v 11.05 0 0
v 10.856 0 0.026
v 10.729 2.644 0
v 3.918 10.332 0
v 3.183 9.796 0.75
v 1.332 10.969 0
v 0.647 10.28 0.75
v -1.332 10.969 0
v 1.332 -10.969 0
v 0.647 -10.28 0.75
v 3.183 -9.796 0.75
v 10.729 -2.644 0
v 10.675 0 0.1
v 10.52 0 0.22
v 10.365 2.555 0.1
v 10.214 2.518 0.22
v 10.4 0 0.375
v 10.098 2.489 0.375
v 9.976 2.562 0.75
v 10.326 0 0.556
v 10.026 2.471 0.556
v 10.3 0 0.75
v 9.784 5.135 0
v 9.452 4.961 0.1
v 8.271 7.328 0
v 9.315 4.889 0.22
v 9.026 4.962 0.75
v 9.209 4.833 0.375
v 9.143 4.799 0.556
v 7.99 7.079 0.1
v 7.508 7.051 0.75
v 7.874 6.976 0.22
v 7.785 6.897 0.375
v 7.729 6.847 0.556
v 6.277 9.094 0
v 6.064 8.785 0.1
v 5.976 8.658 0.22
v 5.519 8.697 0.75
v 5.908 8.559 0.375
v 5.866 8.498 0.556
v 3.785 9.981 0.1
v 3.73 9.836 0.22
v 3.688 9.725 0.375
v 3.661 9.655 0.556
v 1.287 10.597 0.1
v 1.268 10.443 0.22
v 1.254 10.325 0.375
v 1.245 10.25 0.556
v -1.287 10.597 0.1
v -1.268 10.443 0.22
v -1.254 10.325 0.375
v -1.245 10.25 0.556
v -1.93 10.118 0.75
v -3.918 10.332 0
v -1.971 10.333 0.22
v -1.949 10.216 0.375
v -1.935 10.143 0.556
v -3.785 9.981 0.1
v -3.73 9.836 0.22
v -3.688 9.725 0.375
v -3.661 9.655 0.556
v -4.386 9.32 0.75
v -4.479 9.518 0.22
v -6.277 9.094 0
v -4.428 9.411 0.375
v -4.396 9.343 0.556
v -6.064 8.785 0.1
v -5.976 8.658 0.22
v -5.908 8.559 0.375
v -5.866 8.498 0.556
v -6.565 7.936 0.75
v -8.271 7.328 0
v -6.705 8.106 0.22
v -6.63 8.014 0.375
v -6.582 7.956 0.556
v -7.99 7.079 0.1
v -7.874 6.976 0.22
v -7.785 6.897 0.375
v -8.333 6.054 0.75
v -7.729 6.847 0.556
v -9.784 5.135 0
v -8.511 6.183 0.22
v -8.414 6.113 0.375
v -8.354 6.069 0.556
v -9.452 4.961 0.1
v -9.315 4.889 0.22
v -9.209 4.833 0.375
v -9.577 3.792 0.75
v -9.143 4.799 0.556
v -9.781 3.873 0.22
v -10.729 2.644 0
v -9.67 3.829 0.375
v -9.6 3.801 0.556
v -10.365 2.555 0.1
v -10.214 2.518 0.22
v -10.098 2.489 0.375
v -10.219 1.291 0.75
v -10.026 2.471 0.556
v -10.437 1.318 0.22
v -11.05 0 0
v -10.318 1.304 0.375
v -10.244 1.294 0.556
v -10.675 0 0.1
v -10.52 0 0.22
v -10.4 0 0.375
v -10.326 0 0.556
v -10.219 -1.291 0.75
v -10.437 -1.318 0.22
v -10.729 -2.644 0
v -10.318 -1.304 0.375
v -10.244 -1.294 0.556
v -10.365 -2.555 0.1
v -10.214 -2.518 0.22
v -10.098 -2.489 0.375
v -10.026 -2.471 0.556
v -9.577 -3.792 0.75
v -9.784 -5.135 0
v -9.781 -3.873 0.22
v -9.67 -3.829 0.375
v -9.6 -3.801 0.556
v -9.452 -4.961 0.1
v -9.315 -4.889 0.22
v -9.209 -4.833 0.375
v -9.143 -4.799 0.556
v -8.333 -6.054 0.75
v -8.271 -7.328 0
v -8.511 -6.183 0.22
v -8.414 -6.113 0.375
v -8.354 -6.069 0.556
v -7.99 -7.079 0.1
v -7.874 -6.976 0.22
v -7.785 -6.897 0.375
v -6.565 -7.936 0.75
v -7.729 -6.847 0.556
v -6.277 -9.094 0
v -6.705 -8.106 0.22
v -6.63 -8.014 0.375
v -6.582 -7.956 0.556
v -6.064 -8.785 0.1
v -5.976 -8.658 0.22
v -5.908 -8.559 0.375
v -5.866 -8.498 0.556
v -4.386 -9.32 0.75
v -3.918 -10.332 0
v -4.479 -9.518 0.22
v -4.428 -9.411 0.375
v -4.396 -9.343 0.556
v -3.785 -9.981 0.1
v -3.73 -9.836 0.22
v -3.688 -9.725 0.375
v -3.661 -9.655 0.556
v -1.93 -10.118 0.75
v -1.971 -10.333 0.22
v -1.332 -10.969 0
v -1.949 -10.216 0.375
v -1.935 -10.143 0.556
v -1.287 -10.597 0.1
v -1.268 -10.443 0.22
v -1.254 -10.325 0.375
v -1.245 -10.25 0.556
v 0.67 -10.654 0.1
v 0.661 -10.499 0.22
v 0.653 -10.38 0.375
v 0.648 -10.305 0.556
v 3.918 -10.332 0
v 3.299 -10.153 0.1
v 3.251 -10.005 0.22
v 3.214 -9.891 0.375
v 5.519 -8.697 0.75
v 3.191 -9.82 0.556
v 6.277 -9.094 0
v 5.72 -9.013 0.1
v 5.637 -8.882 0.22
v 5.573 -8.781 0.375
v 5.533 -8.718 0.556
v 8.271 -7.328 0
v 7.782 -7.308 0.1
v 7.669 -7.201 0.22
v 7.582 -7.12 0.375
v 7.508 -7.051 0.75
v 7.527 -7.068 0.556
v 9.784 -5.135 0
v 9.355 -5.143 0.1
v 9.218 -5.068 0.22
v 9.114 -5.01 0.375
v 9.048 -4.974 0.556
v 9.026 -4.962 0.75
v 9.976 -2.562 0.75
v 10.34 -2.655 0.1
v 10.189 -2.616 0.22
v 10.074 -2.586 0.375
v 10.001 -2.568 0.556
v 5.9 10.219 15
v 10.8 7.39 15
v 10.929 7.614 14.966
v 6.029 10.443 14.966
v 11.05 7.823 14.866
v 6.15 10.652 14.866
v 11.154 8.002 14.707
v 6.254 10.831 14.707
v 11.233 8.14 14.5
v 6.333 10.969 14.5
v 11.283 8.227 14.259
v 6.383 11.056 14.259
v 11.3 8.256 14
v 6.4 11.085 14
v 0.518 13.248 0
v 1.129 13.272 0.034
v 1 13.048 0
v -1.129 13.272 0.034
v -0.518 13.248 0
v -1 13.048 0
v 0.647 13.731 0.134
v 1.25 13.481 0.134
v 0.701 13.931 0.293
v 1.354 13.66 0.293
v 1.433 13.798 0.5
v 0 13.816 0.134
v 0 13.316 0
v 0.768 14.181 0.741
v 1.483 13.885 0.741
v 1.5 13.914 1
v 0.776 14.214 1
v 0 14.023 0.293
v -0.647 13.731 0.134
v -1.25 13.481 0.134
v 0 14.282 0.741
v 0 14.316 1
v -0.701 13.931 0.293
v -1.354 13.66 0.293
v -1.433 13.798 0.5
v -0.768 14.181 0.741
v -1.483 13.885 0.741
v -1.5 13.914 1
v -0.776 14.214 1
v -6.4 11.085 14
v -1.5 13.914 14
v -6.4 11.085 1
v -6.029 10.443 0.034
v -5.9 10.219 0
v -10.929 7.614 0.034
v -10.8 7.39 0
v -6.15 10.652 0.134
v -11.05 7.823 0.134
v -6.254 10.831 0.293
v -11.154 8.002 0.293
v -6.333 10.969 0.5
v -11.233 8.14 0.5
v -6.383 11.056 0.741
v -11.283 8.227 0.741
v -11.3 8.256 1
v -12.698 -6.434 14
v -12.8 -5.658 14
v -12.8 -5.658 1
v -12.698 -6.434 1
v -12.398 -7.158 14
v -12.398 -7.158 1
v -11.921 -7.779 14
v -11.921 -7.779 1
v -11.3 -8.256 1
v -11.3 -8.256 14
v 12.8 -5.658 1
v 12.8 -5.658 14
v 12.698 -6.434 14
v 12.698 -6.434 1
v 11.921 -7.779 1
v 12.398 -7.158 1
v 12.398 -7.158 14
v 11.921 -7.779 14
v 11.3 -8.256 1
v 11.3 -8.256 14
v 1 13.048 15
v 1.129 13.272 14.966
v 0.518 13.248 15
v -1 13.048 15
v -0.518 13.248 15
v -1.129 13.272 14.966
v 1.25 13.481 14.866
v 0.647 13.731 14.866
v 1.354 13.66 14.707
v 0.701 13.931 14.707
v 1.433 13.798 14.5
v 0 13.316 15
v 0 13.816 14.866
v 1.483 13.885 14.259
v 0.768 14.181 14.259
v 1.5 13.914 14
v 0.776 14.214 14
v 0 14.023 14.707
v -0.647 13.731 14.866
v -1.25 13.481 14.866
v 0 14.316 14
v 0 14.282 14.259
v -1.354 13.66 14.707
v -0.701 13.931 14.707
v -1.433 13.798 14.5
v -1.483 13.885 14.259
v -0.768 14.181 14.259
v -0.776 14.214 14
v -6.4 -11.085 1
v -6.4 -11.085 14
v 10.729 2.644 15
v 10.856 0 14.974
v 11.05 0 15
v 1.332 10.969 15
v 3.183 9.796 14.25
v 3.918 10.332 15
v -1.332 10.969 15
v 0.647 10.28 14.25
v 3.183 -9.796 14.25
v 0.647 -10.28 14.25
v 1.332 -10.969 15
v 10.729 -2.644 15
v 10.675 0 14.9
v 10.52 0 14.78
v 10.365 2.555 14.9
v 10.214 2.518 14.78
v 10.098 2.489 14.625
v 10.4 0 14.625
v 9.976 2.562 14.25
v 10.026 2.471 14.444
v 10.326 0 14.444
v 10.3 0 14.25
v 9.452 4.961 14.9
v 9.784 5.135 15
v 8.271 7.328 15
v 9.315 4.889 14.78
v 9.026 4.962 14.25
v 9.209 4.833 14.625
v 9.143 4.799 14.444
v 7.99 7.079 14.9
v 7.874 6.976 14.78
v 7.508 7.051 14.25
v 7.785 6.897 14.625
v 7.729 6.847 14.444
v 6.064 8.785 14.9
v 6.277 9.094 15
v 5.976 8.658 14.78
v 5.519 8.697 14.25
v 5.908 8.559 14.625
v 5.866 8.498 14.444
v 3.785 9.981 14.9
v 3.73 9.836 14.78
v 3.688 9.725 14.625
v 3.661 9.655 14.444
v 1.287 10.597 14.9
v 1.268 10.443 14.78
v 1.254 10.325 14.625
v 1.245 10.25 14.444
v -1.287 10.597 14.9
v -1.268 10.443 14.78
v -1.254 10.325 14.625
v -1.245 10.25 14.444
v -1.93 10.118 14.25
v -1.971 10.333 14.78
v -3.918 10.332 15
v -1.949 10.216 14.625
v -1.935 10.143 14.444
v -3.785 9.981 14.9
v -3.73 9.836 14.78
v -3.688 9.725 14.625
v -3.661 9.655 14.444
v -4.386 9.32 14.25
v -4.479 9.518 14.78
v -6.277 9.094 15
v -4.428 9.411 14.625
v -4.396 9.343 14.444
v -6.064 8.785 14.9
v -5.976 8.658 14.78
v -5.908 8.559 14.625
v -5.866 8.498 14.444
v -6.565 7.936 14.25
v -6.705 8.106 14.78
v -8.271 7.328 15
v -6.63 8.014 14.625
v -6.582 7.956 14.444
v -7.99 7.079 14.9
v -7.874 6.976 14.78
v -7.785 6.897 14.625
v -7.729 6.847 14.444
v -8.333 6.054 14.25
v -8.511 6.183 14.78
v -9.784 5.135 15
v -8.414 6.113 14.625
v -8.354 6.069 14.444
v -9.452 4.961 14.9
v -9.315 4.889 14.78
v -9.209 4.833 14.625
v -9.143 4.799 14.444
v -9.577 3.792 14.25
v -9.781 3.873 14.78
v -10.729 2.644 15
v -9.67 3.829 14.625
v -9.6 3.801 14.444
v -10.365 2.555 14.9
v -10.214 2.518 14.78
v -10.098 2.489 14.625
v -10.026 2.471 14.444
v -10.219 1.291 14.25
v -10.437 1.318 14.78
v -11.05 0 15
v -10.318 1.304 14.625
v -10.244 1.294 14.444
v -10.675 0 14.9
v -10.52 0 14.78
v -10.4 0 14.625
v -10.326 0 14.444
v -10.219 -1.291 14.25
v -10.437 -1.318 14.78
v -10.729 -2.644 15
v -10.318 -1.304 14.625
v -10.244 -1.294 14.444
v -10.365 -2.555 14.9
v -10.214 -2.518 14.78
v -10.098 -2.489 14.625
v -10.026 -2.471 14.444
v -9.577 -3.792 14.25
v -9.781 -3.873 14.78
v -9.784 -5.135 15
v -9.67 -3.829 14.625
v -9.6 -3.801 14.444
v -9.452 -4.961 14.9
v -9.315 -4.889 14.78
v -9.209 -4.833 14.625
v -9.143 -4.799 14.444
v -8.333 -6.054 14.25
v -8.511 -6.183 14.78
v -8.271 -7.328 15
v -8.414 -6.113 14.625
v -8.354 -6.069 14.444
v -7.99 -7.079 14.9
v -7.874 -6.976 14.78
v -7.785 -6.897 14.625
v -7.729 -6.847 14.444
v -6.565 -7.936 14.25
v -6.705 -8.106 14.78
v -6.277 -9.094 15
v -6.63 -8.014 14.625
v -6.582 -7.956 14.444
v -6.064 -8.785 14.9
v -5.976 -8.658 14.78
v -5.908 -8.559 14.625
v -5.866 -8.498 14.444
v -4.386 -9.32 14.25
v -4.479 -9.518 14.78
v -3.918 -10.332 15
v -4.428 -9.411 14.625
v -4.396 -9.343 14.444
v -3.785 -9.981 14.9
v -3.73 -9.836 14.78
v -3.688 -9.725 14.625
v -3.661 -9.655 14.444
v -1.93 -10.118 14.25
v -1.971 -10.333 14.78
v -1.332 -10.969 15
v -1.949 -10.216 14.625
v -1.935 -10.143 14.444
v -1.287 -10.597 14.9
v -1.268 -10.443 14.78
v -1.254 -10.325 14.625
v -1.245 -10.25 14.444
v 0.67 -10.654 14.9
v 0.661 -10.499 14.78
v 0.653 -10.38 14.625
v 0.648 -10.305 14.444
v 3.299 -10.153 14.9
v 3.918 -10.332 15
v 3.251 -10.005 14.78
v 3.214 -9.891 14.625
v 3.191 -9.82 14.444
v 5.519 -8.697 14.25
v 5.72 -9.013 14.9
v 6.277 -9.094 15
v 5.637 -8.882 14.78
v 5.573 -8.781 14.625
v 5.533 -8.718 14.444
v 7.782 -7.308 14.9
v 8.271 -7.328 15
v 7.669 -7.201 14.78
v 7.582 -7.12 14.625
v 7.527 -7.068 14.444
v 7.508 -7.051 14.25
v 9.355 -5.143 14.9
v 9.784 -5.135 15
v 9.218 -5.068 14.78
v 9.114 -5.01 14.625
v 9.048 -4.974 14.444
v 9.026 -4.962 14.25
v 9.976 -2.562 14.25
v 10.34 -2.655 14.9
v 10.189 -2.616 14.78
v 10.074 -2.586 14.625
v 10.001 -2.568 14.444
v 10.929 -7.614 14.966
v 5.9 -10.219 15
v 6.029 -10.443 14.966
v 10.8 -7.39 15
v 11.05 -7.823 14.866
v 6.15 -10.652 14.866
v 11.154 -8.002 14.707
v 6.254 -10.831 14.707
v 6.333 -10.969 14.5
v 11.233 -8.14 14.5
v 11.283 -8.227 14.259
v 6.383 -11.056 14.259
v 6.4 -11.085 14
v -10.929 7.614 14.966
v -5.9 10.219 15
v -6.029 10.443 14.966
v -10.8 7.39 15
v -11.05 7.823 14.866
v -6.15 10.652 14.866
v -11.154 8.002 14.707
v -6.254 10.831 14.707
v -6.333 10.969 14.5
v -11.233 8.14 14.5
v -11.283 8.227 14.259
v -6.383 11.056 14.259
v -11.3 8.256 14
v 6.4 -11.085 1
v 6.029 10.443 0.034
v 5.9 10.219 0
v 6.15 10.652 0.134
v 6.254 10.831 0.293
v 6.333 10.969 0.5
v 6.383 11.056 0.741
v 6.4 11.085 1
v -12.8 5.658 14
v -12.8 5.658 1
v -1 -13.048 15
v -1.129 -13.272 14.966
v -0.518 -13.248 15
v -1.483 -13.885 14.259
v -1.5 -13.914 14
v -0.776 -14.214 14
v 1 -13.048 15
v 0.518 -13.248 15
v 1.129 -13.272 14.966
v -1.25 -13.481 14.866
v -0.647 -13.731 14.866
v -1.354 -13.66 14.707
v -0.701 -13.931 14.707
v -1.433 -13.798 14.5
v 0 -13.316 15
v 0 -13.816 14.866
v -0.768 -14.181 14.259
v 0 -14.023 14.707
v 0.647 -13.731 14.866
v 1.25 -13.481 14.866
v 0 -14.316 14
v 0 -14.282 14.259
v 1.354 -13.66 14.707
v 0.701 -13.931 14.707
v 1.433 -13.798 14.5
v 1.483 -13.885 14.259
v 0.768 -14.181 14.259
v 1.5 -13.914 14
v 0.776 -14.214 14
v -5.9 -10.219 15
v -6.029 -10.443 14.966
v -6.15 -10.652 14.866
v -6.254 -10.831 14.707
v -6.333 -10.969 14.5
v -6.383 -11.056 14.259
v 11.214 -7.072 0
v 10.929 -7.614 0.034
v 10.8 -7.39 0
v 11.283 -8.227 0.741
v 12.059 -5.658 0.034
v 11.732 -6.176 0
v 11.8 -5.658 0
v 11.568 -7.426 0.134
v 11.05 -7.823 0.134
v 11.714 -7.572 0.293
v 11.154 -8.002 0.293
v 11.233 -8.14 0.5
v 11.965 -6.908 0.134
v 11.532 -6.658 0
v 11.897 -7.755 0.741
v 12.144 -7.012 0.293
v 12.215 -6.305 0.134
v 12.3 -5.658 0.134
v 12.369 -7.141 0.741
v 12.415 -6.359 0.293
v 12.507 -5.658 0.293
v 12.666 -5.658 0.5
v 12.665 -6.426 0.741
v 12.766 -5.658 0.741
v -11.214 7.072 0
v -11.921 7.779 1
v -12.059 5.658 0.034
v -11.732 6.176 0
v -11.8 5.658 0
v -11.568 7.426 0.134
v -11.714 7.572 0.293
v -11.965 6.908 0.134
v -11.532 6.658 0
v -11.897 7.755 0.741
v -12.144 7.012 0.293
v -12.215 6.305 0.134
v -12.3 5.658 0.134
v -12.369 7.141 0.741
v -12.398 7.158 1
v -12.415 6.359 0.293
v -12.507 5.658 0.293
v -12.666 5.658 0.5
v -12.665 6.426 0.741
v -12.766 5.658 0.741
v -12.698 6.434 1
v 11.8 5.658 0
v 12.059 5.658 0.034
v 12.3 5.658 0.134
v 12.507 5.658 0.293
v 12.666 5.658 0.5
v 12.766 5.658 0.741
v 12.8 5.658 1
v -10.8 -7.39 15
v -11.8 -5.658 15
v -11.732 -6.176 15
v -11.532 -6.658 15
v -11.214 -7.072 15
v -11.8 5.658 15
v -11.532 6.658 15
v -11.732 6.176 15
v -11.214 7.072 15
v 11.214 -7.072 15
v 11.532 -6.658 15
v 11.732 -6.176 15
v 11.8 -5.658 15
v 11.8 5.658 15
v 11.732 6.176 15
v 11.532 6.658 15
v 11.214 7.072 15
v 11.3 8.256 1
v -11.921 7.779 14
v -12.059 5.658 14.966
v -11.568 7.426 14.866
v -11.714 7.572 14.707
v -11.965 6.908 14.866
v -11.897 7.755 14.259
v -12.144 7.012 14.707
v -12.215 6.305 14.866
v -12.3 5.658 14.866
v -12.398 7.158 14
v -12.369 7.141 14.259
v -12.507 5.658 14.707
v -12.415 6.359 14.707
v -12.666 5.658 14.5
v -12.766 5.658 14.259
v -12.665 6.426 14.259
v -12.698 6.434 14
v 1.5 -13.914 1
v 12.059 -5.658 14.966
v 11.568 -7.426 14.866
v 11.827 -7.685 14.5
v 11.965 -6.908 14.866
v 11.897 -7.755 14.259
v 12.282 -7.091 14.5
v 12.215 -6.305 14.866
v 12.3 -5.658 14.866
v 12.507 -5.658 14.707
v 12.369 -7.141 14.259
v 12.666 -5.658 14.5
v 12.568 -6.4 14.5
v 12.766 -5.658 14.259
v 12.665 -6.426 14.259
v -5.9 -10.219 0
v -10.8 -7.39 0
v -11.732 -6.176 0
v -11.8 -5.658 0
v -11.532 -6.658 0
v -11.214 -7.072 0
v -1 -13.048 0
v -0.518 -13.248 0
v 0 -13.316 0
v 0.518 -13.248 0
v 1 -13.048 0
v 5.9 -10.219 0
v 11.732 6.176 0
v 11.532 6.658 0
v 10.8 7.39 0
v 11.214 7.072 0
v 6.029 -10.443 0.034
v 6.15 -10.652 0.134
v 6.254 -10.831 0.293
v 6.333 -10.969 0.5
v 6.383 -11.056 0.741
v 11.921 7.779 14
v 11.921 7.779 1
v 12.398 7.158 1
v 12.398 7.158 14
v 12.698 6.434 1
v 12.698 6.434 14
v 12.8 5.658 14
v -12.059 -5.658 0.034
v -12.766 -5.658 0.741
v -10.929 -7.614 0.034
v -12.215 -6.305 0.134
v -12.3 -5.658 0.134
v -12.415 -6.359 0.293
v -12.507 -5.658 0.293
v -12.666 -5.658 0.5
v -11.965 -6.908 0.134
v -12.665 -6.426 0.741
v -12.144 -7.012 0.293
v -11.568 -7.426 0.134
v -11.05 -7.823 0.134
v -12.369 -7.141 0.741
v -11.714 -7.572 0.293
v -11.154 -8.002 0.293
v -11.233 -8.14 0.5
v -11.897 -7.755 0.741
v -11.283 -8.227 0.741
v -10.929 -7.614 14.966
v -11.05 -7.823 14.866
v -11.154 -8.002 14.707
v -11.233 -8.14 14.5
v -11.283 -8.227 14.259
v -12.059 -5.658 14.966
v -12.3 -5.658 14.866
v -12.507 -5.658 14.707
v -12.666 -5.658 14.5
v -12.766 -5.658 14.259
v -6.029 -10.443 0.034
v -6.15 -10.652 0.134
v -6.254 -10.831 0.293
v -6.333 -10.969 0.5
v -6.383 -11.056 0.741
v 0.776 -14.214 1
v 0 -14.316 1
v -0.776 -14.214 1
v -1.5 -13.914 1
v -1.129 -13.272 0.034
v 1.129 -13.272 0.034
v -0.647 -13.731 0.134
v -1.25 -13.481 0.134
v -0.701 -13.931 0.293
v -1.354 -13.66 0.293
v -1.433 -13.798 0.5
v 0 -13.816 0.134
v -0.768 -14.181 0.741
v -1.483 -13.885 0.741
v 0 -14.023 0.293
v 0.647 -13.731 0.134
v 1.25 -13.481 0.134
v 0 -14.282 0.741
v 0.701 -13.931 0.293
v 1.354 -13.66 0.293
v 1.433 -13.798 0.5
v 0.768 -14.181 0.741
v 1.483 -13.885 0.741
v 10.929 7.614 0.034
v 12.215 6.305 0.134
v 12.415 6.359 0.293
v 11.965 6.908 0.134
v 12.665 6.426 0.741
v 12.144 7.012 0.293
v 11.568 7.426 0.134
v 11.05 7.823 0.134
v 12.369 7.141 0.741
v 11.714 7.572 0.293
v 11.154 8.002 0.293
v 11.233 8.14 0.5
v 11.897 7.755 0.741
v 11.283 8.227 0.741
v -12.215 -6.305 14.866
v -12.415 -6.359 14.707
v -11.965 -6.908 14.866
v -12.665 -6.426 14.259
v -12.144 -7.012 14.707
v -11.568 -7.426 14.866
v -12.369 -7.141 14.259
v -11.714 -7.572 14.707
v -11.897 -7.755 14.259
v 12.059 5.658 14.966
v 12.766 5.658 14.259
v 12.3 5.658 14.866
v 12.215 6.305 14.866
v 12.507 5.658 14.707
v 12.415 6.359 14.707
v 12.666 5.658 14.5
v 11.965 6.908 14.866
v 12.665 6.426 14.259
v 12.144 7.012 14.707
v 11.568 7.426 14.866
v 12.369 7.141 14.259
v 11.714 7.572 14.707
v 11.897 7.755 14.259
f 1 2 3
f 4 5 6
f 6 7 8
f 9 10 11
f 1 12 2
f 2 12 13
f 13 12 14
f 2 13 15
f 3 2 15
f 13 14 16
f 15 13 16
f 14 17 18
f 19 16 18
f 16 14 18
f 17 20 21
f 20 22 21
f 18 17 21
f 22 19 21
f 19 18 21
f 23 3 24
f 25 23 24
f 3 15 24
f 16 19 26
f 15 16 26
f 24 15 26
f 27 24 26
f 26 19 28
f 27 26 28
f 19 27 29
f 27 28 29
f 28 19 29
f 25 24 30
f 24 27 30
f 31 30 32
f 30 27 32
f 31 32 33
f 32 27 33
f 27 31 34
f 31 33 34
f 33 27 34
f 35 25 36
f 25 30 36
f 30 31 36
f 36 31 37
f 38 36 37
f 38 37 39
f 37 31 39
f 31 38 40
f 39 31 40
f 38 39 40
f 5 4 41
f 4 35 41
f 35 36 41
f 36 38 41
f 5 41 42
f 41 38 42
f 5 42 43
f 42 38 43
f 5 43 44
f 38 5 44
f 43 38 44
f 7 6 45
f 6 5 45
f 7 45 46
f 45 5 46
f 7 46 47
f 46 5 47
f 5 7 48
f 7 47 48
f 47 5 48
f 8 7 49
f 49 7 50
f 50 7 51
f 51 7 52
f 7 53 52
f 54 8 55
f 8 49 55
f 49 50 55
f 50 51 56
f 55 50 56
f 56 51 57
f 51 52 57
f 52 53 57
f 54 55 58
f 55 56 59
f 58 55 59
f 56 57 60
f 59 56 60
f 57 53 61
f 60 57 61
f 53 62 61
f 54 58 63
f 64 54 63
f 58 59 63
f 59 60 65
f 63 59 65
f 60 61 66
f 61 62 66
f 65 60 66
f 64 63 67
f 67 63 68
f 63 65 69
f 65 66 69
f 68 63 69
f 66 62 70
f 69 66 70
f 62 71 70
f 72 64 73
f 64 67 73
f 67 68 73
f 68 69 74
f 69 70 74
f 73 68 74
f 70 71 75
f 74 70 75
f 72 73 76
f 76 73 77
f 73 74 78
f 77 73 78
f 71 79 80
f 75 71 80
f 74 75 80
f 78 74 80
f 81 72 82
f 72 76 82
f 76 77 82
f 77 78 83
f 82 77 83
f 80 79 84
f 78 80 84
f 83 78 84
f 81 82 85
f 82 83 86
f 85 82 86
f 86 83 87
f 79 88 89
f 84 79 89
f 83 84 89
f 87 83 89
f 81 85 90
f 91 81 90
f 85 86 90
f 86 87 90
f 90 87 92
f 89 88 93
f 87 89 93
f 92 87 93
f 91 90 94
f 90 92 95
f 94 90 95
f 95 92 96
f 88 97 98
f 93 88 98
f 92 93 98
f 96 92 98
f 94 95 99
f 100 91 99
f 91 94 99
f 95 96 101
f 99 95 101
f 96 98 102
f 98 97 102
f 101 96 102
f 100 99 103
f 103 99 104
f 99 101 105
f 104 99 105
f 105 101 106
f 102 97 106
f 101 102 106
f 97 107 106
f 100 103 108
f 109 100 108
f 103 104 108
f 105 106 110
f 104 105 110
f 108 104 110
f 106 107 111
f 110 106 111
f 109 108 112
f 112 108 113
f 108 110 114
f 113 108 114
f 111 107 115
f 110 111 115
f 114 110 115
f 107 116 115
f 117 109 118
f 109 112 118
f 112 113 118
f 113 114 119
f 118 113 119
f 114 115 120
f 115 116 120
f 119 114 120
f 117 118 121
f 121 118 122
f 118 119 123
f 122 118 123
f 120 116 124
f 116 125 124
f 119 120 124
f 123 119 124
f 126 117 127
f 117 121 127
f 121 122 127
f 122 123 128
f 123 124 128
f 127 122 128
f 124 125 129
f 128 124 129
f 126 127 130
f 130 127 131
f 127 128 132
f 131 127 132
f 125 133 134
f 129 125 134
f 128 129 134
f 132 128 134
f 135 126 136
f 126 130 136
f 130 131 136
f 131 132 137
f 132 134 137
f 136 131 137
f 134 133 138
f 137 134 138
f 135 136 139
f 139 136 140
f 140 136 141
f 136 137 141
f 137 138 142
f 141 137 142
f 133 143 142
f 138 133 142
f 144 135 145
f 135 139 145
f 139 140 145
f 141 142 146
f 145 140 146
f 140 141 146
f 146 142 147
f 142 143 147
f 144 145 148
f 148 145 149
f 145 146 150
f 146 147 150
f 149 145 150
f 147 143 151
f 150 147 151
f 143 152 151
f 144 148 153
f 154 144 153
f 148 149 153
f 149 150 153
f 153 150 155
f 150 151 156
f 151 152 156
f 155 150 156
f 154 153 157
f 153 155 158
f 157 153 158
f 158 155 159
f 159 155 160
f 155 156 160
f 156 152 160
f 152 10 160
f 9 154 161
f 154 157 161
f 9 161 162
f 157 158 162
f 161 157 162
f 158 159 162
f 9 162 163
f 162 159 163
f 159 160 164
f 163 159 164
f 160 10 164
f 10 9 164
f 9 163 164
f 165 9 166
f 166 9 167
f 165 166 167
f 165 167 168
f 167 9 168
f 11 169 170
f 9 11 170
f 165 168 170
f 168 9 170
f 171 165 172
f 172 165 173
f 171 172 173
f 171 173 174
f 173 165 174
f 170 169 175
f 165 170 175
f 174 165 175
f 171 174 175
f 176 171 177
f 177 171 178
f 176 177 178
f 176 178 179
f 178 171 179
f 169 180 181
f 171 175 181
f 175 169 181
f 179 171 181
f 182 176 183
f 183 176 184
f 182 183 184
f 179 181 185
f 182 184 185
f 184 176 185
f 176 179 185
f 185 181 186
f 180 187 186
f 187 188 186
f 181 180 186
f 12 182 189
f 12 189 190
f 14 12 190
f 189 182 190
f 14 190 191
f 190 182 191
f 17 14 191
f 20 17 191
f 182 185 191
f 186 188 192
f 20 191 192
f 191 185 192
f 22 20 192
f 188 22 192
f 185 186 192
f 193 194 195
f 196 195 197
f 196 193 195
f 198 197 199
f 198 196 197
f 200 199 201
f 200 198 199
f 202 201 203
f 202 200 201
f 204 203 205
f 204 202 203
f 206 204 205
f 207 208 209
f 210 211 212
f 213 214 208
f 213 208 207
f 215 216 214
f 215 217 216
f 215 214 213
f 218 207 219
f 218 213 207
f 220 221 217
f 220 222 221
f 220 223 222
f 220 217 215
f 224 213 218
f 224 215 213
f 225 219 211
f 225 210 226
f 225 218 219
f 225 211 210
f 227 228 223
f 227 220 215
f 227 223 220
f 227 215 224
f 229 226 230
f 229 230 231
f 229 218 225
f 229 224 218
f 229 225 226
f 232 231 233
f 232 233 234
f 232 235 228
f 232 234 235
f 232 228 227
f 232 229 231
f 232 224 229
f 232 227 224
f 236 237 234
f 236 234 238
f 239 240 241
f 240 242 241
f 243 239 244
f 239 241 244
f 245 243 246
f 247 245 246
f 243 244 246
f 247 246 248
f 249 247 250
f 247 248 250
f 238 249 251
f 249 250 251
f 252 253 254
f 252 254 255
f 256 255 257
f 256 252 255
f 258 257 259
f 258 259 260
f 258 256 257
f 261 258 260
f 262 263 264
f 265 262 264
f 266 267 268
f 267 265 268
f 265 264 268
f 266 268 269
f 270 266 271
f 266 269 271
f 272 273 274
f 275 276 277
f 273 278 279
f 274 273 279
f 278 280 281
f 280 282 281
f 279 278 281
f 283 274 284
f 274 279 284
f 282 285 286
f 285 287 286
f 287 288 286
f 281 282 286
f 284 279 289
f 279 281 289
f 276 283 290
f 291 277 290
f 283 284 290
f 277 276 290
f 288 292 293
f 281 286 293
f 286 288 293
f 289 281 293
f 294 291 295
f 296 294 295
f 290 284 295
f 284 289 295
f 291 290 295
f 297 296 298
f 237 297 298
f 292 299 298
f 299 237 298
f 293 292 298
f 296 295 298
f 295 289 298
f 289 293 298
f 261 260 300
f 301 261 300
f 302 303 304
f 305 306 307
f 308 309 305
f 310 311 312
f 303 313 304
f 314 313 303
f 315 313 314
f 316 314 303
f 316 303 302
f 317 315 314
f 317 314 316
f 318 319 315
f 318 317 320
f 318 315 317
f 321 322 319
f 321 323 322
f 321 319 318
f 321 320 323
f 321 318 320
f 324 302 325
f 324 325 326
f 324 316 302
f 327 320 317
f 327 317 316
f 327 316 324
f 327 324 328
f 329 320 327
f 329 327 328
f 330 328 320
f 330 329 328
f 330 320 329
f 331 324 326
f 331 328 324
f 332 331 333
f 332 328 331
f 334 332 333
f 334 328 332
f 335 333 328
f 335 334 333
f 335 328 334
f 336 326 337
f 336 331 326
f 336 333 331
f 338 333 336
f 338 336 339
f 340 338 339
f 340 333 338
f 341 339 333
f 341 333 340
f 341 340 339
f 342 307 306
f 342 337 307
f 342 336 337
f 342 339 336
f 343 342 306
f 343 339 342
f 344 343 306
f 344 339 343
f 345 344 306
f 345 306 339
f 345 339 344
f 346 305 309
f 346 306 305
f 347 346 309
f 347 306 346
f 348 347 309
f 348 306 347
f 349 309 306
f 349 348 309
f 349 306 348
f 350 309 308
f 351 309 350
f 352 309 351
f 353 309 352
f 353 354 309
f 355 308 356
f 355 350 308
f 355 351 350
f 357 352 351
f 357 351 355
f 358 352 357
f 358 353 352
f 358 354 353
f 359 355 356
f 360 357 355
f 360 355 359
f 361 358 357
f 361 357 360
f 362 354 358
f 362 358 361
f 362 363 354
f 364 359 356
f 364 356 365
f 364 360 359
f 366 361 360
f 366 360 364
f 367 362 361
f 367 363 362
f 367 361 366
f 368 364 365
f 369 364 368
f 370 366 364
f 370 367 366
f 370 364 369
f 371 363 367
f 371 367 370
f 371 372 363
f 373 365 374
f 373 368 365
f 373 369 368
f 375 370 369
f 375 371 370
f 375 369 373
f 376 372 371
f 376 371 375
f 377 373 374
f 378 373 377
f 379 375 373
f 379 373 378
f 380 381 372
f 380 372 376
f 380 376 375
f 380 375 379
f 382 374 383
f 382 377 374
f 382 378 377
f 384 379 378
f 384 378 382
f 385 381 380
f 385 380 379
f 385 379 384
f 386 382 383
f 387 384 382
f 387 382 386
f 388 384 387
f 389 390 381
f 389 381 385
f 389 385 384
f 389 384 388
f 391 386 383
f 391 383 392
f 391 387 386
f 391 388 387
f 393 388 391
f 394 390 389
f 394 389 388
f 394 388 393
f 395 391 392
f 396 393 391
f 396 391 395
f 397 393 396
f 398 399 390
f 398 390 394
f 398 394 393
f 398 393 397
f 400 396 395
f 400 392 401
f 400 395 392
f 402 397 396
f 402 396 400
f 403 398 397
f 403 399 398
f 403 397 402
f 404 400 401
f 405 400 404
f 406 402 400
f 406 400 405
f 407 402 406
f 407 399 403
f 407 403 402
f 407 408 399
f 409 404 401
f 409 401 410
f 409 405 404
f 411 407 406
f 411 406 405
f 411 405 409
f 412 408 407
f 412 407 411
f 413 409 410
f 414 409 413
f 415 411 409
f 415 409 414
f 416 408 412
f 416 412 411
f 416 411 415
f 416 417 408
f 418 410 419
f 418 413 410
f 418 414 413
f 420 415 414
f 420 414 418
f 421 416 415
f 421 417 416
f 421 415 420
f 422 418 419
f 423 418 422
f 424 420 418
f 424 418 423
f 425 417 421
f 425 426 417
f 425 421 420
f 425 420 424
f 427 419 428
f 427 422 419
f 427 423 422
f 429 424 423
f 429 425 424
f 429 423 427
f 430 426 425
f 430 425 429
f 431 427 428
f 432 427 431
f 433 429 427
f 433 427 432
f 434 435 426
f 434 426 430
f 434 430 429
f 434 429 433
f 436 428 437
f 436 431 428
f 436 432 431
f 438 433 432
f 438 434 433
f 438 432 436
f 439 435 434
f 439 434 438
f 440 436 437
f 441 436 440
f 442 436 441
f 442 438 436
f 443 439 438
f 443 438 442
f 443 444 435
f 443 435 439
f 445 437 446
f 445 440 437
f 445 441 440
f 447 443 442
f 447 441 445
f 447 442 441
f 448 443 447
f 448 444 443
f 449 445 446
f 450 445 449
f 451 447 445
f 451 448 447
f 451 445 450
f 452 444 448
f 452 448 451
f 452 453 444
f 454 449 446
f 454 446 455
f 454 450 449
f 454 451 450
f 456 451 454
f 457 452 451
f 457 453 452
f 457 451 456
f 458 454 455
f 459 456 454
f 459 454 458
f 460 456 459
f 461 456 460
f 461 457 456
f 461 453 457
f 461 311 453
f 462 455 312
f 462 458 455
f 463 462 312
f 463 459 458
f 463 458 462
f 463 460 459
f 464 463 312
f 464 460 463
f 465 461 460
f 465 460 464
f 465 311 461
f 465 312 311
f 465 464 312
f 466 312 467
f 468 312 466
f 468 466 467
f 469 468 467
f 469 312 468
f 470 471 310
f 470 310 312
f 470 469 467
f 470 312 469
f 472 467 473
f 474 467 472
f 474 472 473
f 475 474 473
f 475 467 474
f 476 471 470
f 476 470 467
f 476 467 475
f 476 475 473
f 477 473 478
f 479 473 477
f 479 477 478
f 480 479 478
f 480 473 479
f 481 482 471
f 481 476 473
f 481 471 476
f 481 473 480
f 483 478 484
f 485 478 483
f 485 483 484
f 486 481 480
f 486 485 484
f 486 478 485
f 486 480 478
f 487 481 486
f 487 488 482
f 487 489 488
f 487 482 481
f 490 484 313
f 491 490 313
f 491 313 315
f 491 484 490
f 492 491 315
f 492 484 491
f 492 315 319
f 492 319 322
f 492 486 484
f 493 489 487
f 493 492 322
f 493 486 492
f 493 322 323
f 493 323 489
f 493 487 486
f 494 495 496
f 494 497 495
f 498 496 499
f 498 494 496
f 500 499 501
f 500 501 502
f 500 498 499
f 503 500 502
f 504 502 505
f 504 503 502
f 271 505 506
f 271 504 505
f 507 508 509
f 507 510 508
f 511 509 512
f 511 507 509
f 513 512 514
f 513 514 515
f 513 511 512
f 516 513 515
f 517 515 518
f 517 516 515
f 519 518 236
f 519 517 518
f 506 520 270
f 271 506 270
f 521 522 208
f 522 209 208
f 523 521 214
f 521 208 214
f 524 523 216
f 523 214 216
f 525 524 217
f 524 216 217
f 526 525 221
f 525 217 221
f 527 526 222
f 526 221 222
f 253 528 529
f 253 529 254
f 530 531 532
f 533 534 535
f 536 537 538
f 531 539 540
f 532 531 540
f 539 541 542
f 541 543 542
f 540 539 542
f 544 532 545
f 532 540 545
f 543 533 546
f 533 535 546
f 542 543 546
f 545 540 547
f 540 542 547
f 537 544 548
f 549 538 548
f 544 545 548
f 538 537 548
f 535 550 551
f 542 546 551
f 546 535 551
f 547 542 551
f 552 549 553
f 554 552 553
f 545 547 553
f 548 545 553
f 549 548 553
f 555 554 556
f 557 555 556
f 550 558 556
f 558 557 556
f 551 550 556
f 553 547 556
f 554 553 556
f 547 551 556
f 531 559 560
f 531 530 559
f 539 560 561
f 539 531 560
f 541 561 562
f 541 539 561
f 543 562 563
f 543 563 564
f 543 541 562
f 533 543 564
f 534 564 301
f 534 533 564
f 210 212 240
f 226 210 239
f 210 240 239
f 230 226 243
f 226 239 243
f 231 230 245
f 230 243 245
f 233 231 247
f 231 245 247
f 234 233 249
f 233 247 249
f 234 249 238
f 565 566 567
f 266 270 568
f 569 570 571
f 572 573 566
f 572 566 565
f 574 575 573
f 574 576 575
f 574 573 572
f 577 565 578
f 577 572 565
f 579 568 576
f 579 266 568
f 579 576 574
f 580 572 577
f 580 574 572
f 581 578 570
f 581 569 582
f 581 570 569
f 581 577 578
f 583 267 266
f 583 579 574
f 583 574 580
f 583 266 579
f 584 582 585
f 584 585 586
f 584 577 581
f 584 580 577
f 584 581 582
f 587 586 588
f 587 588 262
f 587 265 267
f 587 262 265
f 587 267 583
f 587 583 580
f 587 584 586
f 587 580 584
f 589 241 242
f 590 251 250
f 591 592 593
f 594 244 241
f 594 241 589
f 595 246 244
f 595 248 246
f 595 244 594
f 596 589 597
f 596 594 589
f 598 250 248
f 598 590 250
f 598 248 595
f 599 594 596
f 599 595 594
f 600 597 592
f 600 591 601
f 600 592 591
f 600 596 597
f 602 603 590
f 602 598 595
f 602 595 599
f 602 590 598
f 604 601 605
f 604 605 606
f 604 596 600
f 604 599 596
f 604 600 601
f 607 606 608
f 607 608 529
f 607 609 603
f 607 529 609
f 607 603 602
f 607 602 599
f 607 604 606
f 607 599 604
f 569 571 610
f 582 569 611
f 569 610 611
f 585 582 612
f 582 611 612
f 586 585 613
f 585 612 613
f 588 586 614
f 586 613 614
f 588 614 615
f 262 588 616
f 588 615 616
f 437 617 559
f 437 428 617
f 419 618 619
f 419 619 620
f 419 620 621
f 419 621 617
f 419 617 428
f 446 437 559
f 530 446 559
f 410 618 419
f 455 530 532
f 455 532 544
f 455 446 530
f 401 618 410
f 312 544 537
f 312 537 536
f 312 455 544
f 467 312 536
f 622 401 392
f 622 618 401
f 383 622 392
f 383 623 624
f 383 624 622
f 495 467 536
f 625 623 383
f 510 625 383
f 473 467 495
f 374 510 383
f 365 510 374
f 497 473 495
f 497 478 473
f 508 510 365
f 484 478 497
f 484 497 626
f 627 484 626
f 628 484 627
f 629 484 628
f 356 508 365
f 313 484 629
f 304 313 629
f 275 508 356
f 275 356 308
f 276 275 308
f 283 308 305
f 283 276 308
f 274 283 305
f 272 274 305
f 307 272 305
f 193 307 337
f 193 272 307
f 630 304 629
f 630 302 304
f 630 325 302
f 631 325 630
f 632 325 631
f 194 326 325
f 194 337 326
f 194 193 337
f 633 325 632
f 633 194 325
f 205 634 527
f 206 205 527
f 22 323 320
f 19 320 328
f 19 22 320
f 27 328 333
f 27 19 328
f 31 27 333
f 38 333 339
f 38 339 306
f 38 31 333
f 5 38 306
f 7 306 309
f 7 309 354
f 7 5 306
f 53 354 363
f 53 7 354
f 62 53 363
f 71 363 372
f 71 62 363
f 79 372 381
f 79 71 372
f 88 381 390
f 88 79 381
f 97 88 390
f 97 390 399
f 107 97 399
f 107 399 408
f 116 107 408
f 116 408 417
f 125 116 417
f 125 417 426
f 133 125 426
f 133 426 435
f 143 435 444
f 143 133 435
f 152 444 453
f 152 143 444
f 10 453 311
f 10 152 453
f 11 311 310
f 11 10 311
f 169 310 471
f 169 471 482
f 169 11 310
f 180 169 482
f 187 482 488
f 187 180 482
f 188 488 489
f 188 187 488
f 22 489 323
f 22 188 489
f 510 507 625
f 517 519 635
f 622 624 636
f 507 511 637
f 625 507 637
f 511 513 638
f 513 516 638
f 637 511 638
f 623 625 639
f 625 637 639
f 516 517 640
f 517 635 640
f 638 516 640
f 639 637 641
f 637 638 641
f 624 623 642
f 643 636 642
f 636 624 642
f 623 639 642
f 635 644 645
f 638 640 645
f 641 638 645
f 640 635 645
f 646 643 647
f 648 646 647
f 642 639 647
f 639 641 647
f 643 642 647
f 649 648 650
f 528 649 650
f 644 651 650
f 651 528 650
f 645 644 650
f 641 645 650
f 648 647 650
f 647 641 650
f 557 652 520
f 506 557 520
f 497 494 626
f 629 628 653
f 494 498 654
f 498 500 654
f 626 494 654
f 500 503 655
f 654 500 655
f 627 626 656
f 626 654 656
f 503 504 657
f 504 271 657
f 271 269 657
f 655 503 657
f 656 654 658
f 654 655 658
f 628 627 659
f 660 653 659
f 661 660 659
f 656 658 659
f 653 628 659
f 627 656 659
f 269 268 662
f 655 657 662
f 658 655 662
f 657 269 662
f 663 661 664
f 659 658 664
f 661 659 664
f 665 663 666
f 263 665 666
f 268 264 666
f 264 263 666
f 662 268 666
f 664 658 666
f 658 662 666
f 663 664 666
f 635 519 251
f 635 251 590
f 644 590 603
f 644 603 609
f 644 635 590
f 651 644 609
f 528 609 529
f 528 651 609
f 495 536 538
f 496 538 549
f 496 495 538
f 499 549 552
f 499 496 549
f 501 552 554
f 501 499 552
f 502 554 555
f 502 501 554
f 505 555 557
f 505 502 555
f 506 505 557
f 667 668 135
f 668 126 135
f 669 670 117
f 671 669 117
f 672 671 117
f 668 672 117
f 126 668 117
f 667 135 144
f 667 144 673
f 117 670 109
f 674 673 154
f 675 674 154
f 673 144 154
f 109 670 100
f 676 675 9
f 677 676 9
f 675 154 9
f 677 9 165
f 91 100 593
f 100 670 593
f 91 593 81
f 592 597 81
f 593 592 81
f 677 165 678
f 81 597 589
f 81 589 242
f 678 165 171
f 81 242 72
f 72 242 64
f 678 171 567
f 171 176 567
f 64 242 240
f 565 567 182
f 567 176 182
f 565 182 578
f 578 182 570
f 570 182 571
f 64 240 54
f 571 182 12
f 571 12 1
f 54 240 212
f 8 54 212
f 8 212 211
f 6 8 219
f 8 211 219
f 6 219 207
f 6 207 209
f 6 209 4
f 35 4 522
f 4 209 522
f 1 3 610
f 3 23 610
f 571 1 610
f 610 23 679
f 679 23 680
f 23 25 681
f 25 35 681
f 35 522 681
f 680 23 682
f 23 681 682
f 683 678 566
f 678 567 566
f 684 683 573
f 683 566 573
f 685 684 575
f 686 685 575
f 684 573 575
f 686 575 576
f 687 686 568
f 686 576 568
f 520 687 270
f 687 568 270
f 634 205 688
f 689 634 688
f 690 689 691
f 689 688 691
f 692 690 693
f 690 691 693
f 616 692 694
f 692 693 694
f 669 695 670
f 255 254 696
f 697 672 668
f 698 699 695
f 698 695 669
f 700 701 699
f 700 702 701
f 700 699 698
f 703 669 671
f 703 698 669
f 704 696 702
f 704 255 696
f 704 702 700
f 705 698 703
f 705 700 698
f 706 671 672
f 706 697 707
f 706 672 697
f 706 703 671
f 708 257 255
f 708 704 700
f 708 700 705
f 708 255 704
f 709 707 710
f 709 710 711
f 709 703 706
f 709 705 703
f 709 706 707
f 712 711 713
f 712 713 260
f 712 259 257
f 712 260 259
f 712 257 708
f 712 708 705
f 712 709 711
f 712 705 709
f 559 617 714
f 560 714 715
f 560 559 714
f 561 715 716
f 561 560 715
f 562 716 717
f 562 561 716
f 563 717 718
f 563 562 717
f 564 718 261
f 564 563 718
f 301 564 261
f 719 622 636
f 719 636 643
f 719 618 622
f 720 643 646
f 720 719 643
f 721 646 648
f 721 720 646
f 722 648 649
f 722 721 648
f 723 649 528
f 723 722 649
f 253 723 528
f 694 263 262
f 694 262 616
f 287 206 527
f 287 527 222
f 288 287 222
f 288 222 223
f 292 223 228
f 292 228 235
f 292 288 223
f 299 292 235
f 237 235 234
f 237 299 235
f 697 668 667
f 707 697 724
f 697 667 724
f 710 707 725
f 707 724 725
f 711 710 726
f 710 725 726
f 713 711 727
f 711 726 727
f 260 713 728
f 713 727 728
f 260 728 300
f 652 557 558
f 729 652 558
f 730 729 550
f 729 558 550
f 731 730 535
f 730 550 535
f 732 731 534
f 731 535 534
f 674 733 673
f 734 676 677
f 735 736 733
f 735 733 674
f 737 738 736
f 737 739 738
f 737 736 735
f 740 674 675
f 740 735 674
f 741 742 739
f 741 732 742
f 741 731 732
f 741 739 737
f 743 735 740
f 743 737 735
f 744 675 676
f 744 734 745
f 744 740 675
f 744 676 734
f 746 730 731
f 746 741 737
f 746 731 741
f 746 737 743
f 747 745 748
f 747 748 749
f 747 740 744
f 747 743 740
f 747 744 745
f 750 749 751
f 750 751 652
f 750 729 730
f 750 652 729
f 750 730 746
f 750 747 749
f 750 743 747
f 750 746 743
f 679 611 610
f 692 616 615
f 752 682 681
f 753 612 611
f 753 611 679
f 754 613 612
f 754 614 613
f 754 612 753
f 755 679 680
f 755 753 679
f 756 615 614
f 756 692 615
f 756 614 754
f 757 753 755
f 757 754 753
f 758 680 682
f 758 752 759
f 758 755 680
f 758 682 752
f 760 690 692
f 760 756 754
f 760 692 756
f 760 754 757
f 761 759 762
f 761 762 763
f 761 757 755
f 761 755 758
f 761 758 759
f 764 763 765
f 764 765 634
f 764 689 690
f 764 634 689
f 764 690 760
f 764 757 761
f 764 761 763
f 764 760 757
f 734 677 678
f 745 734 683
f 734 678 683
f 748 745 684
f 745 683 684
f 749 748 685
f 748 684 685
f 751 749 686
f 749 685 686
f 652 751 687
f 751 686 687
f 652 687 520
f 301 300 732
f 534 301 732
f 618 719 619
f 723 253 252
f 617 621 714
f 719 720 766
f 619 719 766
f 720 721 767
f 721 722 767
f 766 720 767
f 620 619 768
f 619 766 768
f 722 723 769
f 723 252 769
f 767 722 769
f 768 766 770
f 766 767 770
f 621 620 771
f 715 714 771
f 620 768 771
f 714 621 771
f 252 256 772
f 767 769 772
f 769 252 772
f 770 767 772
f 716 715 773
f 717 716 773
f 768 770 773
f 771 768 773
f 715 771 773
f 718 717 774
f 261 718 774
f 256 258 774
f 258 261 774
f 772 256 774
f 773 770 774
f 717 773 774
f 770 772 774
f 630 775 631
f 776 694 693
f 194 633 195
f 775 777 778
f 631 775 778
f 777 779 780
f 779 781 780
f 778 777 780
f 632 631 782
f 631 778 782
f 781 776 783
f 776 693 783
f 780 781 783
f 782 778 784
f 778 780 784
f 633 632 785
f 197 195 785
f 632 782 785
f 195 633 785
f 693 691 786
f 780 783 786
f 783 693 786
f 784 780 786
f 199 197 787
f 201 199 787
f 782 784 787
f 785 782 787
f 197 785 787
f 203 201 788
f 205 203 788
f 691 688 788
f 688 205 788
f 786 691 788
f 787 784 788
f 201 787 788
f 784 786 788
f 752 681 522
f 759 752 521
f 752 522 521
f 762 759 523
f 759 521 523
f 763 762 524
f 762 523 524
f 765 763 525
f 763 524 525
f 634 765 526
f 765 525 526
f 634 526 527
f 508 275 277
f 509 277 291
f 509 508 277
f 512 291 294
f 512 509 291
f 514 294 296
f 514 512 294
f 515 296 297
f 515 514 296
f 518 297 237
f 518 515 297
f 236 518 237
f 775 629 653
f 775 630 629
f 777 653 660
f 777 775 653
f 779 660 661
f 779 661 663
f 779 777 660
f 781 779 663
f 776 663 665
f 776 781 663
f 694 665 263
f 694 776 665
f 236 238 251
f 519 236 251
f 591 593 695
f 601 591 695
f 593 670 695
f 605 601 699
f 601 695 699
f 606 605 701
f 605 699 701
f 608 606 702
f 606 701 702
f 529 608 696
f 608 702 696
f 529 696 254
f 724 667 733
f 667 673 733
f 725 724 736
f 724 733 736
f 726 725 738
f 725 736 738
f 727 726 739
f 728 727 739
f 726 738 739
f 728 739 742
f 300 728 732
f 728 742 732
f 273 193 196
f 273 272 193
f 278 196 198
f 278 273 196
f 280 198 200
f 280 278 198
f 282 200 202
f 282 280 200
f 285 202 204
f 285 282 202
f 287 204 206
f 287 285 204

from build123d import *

# Parameters (mm, degrees)
F0_R     = 10.3
F1_DEPTH = 15
F2_R     = 3
F3_R     = 1
F4_R     = 0.75


with BuildPart() as f1:
    # F0 (on Top) → F1 (new body)
    with BuildSketch(Plane.XY):
        with BuildLine():
            ThreePointArc((6.3999998246, 11.0851252697), (11.0851251178, 6.4000000877), (12.8, 0))
            Line((12.8, 0), (12.8, 7.3900834456))
            Line((12.8, 7.3900834456), (6.3999998246, 11.0851252697))
        make_face()
        with BuildLine():
            ThreePointArc((-6.3999998359, 11.0851252632), (-6.6e-09, 12.8), (6.3999998246, 11.0851252697))
            Line((6.3999998246, 11.0851252697), (0, 14.7801668913))
            Line((0, 14.7801668913), (-6.3999998359, 11.0851252632))
        make_face()
        with BuildLine():
            ThreePointArc((-12.8, 0), (-11.0851251211, 6.400000082), (-6.3999998359, 11.0851252632))
            Line((-6.3999998359, 11.0851252632), (-12.8, 7.3900834456))
            Line((-12.8, 7.3900834456), (-12.8, 0))
        make_face()
        with BuildLine():
            Line((-12.8, -7.3900834456), (-6.4000000251, -11.085125154))
            ThreePointArc((-6.4000000251, -11.085125154), (-11.0851251757, -6.3999999875), (-12.8, 0))
            Line((-12.8, 0), (-12.8, -7.3900834456))
        make_face()
        with BuildLine():
            Line((0, -14.7801668913), (6.3999998359, -11.0851252632))
            ThreePointArc((6.3999998359, -11.0851252632), (-1.092e-07, -12.8), (-6.4000000251, -11.085125154))
            Line((-6.4000000251, -11.085125154), (0, -14.7801668913))
        make_face()
        with BuildLine():
            Line((12.8, -7.3900834456), (12.8, 0))
            ThreePointArc((12.8, 0), (11.0851251211, -6.400000082), (6.3999998359, -11.0851252632))
            Line((6.3999998359, -11.0851252632), (12.8, -7.3900834456))
        make_face()
        with BuildLine():
            ThreePointArc((6.3999998359, -11.0851252632), (11.0851251211, -6.400000082), (12.8, 0))
            ThreePointArc((12.8, 0), (11.0851251178, 6.4000000877), (6.3999998246, 11.0851252697))
            ThreePointArc((6.3999998246, 11.0851252697), (-6.6e-09, 12.8), (-6.3999998359, 11.0851252632))
            ThreePointArc((-6.3999998359, 11.0851252632), (-11.0851251211, 6.400000082), (-12.8, 0))
            ThreePointArc((-12.8, 0), (-11.0851251757, -6.3999999875), (-6.4000000251, -11.085125154))
            ThreePointArc((-6.4000000251, -11.085125154), (-1.092e-07, -12.8), (6.3999998359, -11.0851252632))
        make_face()
        Circle(F0_R, mode=Mode.SUBTRACT)
    extrude(amount=F1_DEPTH)

    # F2
    f2_edges = [f1.edges().sort_by_distance(p)[0] for p in [
        (0, 14.780167, 7.5),
        (12.8, 7.390083, 7.5),
        (12.8, -7.390083, 7.5),
        (0, -14.780167, 7.5),
        (-12.8, -7.390083, 7.5),
        (-12.8, 7.390083, 7.5),
    ]]
    fillet(f2_edges, radius=F2_R)

    # F3
    f3_edges = [f1.edges().sort_by_distance(p)[0] for p in [
        (12.8, 0, 15),
        (12.398076, -7.158033, 15),
        (6.4, -11.085125, 15),
        (-6.4, -11.085125, 15),
        (-12.398076, 7.158033, 15),
        (-12.8, 0, 15),
        (-6.4, 11.085125, 15),
        (6.4, 11.085125, 15),
        (0, 14.316065, 15),
        (12.398076, 7.158033, 15),
        (-6.4, -11.085125, 0),
        (12.398076, -7.158033, 0),
    ]]
    fillet(f3_edges, radius=F3_R)

    # F4
    f4_edges = [f1.edges().sort_by_distance(p)[0] for p in [
        (-10.3, 0, 0),
        (-10.3, 0, 15),
    ]]
    fillet(f4_edges, radius=F4_R)


solid = f1.part
